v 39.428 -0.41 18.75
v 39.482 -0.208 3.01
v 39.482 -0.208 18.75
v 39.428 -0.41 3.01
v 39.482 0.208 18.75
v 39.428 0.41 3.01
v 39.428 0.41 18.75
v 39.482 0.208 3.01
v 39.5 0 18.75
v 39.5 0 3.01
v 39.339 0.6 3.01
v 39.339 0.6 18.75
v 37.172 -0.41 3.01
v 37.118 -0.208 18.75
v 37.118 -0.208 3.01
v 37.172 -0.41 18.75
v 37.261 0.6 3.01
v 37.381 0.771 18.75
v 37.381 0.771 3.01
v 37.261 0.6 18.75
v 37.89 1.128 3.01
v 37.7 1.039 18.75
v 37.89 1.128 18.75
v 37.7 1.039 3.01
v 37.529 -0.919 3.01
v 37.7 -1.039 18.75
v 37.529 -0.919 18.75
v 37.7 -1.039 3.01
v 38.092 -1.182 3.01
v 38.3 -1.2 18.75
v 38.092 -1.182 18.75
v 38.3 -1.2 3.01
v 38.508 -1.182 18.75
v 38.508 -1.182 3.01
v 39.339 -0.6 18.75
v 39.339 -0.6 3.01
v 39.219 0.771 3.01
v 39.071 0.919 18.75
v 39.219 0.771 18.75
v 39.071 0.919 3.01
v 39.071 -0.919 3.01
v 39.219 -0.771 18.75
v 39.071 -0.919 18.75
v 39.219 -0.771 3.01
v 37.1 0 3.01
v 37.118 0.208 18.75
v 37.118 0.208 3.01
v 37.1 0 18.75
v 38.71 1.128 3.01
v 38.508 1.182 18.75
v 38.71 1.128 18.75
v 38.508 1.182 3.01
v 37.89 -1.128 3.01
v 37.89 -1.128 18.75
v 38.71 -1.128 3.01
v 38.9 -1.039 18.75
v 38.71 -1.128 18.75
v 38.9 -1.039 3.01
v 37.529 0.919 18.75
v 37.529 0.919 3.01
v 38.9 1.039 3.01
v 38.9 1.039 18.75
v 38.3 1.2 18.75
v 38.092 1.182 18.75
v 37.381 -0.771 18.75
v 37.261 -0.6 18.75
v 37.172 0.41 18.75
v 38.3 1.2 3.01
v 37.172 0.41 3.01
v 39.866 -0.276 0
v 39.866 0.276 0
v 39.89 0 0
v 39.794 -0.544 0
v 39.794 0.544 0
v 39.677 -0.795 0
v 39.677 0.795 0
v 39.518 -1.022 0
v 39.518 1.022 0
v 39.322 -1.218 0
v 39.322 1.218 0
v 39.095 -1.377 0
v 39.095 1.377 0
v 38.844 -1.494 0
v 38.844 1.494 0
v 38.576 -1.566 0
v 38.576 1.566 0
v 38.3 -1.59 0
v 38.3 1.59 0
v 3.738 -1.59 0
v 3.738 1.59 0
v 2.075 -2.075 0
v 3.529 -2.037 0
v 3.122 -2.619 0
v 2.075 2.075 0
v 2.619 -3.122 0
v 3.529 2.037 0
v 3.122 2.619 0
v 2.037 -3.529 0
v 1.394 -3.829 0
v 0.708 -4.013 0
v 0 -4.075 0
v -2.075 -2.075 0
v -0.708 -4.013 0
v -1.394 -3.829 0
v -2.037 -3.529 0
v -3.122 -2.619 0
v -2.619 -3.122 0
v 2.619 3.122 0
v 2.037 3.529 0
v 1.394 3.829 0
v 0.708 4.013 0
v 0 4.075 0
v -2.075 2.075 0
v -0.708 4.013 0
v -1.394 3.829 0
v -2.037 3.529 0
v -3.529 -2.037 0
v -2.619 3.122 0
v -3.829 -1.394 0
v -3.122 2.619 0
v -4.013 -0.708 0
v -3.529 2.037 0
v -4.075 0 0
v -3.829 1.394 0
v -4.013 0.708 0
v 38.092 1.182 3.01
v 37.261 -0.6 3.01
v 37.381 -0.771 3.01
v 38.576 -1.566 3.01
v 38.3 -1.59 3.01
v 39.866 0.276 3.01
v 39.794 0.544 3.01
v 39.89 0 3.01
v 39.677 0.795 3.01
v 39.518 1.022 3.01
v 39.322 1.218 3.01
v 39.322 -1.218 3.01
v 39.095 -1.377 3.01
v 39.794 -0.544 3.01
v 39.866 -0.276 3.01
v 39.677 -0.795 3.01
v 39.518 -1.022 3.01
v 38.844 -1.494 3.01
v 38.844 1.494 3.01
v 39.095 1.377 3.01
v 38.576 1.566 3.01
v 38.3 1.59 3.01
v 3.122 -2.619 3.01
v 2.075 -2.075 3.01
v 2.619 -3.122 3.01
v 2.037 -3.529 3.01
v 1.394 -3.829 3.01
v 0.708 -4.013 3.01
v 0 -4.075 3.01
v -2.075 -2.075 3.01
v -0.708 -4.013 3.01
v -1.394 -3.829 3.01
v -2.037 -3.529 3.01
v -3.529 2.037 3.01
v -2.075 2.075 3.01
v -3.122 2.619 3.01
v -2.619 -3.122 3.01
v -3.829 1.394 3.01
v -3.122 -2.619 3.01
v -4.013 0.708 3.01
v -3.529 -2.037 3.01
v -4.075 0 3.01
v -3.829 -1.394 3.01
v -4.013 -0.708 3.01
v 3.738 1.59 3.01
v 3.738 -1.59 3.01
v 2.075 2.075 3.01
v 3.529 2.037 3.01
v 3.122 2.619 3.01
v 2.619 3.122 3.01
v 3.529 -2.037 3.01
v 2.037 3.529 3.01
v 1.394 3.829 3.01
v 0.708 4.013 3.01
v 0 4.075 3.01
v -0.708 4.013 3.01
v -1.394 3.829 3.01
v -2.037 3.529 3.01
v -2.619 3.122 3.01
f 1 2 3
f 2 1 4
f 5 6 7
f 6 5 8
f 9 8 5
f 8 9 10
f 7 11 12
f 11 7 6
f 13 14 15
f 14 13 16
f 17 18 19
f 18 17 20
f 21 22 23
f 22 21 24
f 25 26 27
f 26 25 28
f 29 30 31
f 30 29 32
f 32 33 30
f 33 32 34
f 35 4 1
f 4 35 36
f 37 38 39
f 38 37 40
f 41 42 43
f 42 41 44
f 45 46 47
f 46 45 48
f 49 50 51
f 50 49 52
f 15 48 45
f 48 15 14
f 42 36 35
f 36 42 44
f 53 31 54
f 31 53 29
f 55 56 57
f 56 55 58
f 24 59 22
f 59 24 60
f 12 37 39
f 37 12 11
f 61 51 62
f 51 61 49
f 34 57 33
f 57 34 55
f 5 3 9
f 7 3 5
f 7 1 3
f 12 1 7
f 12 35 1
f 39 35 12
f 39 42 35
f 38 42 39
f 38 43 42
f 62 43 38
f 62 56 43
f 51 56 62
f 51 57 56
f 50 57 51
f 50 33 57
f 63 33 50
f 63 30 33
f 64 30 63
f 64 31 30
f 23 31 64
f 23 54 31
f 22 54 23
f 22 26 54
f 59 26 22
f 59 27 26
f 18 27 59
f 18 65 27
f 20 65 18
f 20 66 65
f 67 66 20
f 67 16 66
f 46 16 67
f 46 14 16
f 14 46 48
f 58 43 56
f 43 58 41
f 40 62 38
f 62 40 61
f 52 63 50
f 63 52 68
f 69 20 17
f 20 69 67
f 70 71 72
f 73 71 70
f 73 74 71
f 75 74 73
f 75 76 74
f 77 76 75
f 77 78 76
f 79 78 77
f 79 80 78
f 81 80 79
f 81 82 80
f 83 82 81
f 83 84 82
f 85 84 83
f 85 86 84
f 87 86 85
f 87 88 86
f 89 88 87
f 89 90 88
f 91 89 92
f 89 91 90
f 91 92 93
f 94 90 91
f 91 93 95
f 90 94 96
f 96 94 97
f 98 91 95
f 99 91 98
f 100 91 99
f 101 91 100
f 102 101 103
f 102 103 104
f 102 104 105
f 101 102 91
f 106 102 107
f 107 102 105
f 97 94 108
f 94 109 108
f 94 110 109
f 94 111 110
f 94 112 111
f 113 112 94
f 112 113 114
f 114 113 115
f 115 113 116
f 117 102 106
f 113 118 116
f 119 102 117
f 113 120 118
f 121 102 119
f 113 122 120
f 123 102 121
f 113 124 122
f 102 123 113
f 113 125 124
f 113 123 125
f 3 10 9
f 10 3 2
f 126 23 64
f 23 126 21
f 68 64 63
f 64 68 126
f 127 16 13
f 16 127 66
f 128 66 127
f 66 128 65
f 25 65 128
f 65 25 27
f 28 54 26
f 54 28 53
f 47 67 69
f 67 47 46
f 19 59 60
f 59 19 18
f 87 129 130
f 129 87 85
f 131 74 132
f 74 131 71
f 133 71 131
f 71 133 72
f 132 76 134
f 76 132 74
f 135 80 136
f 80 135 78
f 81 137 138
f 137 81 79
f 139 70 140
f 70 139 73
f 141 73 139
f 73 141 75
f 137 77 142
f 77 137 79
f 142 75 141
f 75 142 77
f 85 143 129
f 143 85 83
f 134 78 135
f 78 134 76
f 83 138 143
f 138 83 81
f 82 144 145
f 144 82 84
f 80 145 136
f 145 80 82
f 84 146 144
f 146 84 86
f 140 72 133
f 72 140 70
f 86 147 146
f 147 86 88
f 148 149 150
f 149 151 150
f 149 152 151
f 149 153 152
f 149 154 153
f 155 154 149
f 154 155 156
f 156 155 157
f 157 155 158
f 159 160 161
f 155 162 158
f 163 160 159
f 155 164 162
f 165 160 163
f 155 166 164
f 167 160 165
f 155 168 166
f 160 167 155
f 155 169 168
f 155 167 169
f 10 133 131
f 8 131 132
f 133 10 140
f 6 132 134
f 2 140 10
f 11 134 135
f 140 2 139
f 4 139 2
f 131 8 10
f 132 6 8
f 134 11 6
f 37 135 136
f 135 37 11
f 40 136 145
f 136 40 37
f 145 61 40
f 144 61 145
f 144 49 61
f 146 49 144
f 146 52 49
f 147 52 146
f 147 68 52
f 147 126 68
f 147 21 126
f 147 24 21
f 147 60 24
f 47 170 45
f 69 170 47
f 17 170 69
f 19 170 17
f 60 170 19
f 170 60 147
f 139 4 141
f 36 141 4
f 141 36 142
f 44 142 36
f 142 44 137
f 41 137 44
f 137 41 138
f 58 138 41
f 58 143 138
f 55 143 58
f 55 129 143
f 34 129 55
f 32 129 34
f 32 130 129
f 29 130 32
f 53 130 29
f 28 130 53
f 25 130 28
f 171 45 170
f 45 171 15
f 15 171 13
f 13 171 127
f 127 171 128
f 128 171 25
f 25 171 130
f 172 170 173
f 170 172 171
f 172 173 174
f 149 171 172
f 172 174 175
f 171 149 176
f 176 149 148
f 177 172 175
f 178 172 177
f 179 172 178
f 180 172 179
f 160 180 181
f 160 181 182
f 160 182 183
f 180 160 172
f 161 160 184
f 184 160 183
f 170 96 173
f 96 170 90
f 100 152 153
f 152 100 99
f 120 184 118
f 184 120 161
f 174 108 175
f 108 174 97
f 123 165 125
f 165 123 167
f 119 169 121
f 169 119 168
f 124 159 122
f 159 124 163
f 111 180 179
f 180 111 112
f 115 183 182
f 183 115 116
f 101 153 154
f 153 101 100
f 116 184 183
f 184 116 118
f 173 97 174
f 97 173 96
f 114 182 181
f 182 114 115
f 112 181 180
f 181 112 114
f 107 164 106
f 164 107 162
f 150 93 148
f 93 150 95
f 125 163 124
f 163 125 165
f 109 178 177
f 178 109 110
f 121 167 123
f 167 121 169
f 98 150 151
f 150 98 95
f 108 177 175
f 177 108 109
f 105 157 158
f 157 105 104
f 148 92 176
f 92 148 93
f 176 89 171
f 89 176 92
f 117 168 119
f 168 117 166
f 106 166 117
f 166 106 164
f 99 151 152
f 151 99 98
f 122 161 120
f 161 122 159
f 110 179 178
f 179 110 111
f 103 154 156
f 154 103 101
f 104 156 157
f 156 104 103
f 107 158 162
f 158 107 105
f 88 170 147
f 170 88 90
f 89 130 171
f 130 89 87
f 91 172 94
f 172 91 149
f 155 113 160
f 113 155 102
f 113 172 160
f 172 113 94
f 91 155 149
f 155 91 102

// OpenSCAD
/*
 * Copyright ©2015 Laurence Gonsalves <laurence@xenomachina.com>
 *
 * This library is free software; you can redistribute it and/or
 * modify it under the terms of the GNU Lesser General Public
 * License as published by the Free Software Foundation; either
 * version 2.1 of the License, or any later version.
 *
 * This library is distributed in the hope that it will be useful,
 * but WITHOUT ANY WARRANTY; without even the implied warranty of
 * MERCHANTABILITY or FITNESS FOR A PARTICULAR PURPOSE.  See the GNU
 * Lesser General Public License for more details.
 *
 * You should have received a copy of the GNU Lesser General Public
 * License along with this library; if not, write to:
 *   Free Software Foundation, Inc.
 *   51 Franklin Street, Fifth Floor
 *   Boston, MA  02110-1301
 *   USA
 */

/* This is a replacement part for a "Do-It-Yourself Clock My First Clock" kit.
 * In our kit this part was yellow, and its job was to push the pendulum. The
 * small rod snapped off of ours, so this is an attempt at a replacement part.
 */

$fn = 36;

ring_dialmeter = 8;
square_hole_fudge = 4 - 3.85;
square_hole_length = 4 + square_hole_fudge;
main_thickness = 3.01;
main_width = 3.18;
main_length = 43.89;
rod_diameter = 2.4;
rod_length = 18.75;

module pendulum_pusher() {
    difference() {
        union() {
            // Round end
            cylinder(d=ring_dialmeter + square_hole_fudge, h=main_thickness);

            // Main shaft
            translate([square_hole_length/2, -main_width/2, 0])
                cube([main_length - (square_hole_length + ring_dialmeter + main_width)/2,
                     main_width, main_thickness]);

            translate([main_length - (ring_dialmeter + main_width)/2, 0, 0]) {
                // Pusher rod
                cylinder(d=rod_diameter, h=rod_length);

                // Rounded end of main shaft
                cylinder(d=main_width, h=main_thickness);
            }

        }
        // Square hole
        translate([-square_hole_length/2, -square_hole_length/2, 0])
            cube([square_hole_length, square_hole_length, main_thickness]);
    }
}

pendulum_pusher();
